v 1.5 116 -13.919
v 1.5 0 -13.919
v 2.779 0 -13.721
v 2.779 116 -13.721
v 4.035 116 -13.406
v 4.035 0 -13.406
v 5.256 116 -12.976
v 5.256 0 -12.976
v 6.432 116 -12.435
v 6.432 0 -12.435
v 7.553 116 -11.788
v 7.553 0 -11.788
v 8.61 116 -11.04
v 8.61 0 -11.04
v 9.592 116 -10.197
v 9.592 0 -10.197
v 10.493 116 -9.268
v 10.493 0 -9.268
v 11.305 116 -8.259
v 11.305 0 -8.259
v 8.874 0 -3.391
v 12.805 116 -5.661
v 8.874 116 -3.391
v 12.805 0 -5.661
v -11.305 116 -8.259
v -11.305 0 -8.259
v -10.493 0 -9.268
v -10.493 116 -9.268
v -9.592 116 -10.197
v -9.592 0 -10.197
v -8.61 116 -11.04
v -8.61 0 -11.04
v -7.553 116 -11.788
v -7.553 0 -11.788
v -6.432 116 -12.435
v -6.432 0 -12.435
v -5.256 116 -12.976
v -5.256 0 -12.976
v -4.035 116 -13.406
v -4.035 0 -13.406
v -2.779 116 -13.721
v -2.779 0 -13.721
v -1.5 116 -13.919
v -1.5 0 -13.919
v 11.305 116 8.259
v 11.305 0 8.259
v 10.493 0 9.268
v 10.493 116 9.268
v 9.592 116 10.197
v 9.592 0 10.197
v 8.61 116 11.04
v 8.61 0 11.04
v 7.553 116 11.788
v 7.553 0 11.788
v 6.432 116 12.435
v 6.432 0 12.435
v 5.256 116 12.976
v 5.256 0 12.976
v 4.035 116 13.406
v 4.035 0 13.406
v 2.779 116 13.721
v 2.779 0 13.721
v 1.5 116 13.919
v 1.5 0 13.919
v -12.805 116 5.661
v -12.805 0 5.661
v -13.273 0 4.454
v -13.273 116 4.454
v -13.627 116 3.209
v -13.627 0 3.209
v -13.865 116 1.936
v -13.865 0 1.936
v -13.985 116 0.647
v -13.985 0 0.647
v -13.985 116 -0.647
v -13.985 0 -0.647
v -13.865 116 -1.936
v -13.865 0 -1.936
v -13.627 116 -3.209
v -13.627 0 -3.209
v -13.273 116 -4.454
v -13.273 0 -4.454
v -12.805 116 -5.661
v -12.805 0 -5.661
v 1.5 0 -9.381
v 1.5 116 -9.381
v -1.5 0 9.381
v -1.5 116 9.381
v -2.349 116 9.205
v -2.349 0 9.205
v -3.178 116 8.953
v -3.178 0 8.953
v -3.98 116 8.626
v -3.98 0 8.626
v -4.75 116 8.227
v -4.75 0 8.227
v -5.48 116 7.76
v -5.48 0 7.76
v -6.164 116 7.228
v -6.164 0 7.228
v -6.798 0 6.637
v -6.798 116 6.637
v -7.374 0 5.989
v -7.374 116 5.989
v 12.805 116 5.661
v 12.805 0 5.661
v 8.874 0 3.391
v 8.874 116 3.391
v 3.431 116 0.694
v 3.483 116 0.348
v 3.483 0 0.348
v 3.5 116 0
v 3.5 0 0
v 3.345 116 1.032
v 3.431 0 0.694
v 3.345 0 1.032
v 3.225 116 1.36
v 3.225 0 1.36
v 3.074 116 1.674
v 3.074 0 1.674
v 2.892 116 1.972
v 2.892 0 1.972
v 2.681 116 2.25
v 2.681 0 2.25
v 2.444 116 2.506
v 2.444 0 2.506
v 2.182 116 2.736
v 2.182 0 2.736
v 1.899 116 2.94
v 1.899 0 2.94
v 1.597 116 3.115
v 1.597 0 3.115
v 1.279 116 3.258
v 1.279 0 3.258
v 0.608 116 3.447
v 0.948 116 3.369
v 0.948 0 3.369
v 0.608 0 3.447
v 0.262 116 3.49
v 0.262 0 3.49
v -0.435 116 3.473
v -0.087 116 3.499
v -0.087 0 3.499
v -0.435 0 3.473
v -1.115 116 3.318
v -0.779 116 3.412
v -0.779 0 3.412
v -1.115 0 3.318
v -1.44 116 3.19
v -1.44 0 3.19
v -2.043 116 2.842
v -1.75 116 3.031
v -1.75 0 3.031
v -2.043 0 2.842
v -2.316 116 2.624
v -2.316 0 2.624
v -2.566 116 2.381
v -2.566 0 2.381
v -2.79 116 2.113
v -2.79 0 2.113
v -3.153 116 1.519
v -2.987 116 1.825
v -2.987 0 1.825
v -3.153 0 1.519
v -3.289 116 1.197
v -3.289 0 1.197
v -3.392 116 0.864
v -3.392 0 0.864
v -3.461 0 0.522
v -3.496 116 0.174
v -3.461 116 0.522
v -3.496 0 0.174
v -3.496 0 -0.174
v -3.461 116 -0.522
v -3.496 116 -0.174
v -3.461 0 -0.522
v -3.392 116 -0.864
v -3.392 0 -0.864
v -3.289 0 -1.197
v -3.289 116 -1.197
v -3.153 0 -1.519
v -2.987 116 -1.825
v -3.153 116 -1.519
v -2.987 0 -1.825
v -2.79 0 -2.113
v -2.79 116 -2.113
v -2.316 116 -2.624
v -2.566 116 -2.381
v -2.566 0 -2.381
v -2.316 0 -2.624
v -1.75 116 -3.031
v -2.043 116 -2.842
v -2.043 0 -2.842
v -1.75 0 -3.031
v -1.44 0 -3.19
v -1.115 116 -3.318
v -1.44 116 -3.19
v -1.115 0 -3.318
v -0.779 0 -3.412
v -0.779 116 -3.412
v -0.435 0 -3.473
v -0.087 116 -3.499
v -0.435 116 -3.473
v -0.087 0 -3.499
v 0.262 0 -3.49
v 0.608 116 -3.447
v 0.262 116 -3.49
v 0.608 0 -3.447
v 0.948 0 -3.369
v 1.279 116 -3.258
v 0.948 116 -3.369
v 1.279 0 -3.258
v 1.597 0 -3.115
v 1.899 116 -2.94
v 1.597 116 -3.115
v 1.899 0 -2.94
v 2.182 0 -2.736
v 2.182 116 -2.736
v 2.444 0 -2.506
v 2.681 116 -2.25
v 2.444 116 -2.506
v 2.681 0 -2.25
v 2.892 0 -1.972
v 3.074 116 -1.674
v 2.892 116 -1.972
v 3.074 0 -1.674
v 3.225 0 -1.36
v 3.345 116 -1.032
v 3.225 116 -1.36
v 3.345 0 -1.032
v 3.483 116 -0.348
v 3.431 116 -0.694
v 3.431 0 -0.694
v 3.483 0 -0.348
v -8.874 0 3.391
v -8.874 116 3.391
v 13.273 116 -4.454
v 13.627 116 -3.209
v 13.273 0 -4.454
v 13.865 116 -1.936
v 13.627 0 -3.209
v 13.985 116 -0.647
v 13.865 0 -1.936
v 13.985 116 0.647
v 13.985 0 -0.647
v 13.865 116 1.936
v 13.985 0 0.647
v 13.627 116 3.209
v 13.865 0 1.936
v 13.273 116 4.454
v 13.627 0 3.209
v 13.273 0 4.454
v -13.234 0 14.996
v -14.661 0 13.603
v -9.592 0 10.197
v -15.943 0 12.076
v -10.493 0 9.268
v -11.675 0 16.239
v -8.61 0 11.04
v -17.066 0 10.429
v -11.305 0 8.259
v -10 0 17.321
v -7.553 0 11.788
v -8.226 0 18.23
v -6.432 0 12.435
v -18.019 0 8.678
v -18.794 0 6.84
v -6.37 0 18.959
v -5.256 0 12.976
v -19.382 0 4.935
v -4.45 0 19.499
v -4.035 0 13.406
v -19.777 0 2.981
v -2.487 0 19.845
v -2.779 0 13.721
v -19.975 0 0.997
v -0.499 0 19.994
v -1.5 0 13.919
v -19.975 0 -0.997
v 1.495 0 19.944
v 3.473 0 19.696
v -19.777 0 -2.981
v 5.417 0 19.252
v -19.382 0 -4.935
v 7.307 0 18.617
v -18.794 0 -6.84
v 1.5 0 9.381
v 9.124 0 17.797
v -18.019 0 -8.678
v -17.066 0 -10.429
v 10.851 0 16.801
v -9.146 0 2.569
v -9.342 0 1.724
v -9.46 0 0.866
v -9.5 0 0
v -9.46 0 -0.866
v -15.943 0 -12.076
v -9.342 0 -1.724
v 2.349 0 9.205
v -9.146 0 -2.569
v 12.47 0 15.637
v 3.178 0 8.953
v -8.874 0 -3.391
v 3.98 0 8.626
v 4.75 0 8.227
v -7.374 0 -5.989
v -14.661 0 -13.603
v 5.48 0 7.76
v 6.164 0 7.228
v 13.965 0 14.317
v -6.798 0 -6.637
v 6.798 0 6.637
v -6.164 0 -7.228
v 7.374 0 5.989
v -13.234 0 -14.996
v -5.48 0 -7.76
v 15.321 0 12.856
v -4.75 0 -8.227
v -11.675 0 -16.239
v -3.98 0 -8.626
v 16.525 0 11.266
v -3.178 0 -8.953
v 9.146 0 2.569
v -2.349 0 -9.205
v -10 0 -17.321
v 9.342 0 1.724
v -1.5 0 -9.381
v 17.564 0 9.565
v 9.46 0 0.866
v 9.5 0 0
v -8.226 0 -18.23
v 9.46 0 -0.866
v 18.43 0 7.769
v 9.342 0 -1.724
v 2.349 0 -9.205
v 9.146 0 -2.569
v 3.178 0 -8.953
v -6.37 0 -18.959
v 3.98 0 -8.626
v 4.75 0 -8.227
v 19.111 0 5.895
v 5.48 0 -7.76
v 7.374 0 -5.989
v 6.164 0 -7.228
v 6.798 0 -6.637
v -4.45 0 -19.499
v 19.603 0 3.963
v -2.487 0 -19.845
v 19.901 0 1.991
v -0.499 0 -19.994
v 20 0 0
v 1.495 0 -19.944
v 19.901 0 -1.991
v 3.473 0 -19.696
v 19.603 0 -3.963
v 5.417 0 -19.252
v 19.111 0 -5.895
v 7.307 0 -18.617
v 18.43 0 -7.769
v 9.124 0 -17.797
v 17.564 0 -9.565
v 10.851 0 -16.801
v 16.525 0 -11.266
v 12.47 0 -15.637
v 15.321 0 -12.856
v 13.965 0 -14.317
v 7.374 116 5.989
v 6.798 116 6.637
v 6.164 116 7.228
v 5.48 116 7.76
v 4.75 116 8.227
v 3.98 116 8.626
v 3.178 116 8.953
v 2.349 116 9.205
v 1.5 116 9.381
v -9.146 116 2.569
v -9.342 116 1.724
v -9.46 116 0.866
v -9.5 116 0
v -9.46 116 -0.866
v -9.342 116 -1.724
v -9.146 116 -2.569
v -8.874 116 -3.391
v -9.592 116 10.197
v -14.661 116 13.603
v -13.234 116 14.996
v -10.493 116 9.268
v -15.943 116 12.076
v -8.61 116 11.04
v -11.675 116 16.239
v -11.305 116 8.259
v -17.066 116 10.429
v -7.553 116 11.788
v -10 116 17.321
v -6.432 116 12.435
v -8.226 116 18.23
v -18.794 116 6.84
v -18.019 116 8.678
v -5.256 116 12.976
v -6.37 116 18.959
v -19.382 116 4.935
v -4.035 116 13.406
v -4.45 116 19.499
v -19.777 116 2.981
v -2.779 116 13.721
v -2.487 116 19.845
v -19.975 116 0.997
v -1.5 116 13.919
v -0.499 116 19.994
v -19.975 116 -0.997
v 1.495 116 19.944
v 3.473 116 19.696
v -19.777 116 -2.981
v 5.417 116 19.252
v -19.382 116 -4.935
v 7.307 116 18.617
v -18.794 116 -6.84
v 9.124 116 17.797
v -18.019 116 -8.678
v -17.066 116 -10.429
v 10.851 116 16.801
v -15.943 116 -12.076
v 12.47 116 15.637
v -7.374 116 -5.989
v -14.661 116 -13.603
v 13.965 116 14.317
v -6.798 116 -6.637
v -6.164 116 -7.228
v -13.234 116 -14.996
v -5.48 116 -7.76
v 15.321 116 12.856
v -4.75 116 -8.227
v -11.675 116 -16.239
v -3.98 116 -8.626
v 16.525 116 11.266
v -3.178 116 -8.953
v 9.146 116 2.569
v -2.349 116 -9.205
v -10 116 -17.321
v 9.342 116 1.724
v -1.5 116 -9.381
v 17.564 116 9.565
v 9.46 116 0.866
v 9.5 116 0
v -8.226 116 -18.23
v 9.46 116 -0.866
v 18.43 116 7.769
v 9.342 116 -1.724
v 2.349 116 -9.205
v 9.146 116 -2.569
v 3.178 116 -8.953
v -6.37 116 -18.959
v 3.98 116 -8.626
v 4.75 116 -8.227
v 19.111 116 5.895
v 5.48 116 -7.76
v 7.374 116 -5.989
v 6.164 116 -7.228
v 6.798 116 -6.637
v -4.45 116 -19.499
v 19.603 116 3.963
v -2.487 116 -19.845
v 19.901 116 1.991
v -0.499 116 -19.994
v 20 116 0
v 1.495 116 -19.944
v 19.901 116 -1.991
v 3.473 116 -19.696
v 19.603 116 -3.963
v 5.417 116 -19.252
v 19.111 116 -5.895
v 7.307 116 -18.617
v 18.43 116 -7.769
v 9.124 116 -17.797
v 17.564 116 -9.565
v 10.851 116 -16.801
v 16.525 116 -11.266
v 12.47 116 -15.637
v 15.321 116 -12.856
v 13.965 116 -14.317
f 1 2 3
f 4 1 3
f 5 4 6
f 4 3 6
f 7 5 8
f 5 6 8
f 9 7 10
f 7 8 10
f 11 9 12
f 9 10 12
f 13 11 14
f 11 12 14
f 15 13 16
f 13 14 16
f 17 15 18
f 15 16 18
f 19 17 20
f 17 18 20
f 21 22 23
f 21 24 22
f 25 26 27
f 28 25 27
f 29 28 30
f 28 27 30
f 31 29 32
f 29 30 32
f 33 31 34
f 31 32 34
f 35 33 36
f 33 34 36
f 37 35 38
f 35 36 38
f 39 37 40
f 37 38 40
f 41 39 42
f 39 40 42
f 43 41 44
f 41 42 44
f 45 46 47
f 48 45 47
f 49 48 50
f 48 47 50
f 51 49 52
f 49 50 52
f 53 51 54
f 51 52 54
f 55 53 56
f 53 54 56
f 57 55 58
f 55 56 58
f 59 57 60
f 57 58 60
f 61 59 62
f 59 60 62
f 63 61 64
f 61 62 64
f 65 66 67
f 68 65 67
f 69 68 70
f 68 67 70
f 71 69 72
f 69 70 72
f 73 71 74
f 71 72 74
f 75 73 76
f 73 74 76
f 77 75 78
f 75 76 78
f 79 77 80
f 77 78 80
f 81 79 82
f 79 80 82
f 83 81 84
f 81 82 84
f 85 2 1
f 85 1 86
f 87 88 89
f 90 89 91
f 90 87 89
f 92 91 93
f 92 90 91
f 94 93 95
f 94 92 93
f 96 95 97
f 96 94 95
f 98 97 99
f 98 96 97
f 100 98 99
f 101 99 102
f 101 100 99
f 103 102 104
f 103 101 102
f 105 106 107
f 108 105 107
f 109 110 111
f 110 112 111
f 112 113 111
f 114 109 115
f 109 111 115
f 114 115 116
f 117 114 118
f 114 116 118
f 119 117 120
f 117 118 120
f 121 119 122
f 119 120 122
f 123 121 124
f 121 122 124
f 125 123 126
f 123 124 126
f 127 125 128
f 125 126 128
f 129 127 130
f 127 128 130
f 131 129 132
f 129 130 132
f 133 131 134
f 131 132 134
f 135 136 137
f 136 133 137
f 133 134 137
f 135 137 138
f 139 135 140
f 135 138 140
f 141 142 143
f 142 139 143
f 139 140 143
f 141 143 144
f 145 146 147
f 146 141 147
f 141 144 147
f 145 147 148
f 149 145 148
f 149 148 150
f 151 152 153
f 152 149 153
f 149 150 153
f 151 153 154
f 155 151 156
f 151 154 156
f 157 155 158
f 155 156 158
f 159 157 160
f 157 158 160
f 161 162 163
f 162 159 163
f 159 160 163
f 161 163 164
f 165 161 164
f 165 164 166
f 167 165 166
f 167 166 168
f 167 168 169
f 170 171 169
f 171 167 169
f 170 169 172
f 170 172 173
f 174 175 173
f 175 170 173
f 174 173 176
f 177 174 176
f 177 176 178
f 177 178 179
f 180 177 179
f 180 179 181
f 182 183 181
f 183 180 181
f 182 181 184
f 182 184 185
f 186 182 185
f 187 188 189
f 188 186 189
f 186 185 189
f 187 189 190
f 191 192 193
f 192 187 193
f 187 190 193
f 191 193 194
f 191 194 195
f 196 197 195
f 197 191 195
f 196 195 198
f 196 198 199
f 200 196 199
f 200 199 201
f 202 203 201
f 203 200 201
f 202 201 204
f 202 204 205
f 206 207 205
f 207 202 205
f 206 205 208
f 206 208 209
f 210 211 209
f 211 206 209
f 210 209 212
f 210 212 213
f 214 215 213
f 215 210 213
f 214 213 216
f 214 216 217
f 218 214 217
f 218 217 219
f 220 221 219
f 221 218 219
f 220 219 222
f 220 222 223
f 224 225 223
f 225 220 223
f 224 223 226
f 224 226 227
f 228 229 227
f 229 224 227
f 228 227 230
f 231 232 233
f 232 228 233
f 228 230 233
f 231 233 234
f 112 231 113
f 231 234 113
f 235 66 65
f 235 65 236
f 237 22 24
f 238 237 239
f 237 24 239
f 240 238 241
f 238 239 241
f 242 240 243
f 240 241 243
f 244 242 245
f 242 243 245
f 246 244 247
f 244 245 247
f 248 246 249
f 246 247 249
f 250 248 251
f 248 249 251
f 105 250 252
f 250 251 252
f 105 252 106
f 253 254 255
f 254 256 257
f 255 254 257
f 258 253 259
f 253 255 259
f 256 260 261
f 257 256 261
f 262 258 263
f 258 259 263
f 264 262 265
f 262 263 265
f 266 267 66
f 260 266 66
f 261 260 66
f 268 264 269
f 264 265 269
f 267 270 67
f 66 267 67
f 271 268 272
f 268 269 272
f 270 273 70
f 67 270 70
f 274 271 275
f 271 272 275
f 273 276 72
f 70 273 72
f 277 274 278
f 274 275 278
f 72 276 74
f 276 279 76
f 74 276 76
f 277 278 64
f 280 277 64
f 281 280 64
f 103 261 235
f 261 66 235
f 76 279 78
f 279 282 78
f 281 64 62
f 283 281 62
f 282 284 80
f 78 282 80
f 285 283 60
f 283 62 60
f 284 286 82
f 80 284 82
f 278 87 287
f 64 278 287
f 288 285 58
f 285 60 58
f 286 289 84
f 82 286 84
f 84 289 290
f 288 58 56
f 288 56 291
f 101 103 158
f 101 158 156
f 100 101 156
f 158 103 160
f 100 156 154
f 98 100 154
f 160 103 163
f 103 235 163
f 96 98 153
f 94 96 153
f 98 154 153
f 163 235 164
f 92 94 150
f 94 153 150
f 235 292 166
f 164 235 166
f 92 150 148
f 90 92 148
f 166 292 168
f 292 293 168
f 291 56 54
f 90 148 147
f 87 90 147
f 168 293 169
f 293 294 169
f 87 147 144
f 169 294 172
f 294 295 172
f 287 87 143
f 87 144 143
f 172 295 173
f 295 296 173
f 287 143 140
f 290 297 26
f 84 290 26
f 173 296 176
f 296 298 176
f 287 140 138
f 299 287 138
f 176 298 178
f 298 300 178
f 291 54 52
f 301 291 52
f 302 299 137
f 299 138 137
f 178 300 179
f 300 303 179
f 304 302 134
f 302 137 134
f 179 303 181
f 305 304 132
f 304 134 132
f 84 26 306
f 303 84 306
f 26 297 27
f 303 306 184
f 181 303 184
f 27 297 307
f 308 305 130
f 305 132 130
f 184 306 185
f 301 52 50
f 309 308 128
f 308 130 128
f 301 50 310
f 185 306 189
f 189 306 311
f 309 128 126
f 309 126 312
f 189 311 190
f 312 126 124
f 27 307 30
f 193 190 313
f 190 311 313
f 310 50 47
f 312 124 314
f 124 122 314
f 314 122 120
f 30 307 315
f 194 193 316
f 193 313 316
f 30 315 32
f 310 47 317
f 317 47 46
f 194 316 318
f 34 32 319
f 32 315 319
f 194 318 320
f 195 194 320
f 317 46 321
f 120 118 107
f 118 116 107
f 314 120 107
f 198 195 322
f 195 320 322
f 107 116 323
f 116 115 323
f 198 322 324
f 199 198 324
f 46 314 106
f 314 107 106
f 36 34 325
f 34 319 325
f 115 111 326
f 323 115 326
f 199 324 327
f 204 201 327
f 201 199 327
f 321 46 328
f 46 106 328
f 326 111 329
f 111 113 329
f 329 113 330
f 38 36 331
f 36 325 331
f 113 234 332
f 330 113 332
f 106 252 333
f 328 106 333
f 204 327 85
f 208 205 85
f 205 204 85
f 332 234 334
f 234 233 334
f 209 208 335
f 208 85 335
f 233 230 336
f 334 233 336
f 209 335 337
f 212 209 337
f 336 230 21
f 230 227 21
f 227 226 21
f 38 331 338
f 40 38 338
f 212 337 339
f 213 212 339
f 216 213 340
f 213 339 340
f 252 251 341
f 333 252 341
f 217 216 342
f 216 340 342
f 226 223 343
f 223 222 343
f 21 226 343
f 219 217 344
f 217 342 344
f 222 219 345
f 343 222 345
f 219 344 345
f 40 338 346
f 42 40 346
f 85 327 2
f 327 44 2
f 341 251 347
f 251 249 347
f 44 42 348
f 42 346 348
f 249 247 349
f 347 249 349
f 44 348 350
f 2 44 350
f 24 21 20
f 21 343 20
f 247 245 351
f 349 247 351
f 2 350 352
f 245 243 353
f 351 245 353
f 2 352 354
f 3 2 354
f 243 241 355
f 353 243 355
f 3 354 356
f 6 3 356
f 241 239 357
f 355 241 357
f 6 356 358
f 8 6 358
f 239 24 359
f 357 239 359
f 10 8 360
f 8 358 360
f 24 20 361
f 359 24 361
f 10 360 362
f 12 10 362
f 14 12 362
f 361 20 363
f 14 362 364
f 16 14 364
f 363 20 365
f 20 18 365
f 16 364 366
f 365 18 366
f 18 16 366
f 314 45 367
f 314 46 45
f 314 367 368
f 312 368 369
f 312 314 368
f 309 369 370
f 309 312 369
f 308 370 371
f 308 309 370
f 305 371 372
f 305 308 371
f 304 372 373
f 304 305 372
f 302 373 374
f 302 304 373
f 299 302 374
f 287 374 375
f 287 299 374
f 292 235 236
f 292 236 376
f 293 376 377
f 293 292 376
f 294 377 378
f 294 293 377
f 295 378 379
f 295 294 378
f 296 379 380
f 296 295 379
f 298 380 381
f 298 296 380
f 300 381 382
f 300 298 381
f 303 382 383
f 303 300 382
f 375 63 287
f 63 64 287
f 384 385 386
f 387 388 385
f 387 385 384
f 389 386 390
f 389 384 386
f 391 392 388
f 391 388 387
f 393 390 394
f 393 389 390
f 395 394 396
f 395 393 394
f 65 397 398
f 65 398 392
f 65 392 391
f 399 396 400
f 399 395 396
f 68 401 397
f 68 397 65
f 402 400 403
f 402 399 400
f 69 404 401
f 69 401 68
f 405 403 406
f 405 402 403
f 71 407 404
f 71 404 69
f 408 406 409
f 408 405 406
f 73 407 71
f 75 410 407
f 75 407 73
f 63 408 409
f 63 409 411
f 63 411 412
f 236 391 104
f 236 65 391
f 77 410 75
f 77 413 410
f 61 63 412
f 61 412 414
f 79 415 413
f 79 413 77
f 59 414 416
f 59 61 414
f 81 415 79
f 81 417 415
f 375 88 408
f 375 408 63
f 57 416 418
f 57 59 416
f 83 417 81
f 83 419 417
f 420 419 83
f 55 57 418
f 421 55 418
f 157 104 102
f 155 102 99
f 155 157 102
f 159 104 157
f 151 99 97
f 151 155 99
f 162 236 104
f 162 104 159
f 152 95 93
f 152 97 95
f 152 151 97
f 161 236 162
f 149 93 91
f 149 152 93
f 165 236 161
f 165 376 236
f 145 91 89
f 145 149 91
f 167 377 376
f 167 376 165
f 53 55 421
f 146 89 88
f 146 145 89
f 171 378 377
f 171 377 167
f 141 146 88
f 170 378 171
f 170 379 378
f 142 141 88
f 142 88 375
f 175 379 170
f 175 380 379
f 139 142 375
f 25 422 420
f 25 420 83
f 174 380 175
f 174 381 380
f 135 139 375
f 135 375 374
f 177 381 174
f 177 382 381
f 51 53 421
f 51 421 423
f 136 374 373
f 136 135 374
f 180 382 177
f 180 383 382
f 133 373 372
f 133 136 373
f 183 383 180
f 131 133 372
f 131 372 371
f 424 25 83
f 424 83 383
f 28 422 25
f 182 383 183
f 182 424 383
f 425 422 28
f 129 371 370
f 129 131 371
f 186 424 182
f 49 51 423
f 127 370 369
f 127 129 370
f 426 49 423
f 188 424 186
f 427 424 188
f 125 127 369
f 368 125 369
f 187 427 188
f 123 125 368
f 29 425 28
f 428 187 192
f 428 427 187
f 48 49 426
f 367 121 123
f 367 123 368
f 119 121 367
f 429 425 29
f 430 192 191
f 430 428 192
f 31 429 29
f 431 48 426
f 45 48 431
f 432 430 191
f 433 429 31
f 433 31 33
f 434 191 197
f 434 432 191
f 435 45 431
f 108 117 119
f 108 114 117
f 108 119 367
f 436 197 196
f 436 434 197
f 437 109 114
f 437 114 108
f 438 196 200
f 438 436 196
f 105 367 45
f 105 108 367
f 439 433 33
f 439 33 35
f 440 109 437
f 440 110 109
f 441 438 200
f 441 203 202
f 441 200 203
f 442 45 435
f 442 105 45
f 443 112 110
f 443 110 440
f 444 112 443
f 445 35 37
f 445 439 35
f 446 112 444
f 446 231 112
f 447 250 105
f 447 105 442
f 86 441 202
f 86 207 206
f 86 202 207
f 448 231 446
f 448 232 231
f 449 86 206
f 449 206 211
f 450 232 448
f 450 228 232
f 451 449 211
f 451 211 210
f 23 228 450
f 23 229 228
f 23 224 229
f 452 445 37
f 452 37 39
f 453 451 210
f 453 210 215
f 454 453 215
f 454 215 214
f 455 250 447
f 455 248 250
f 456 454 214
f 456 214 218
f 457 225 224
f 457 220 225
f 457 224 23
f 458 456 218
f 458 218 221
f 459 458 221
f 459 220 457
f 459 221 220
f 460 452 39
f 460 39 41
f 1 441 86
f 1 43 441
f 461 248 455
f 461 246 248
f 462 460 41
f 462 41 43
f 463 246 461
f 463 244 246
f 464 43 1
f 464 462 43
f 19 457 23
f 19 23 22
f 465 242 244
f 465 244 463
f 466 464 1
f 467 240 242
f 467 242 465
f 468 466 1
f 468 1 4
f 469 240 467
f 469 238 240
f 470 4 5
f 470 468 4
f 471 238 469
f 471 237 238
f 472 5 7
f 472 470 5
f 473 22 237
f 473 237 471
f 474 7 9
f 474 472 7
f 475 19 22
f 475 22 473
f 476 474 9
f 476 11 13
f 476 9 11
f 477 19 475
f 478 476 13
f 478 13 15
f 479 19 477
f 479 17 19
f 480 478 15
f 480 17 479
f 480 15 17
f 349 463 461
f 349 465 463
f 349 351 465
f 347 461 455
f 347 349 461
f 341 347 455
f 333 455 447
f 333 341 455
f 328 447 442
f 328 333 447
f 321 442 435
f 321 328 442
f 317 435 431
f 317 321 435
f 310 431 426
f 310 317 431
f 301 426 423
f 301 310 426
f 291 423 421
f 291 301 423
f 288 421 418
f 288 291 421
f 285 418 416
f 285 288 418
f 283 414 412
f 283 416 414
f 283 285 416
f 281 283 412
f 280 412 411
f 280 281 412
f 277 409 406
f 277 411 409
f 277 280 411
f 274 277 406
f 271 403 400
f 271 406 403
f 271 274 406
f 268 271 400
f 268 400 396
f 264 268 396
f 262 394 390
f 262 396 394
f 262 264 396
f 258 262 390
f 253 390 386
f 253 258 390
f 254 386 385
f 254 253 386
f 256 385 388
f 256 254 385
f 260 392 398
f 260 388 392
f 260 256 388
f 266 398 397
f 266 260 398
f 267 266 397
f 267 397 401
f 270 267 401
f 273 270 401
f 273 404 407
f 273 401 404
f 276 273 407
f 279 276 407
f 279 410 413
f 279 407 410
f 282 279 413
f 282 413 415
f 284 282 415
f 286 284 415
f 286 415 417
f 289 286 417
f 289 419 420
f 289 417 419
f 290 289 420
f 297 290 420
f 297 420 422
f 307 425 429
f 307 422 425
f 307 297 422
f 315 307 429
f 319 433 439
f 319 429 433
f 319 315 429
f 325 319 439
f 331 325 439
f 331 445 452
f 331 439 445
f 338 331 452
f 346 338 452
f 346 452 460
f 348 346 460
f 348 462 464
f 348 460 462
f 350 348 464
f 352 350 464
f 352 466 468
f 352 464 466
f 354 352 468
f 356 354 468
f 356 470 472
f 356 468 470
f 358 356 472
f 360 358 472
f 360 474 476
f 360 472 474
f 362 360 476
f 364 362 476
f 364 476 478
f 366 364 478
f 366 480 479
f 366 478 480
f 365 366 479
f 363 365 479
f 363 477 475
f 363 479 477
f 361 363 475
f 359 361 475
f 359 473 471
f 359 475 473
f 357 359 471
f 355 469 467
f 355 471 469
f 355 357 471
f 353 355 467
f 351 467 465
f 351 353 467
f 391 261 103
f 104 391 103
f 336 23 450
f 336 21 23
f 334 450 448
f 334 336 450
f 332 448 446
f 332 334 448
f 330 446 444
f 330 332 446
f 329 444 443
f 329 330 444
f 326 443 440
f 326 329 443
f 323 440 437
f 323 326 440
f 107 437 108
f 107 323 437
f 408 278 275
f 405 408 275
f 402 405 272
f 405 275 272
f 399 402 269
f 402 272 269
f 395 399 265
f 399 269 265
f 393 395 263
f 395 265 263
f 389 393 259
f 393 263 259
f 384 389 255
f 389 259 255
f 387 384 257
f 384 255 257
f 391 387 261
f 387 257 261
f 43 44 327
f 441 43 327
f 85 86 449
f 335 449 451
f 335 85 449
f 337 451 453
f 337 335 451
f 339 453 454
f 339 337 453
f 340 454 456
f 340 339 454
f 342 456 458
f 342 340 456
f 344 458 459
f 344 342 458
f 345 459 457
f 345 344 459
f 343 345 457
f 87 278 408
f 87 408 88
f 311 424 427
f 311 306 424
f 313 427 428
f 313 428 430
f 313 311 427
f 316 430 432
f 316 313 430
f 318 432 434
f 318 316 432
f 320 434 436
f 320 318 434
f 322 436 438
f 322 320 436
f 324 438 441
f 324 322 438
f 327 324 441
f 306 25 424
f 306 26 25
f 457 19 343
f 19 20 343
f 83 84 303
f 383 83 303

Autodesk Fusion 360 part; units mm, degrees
sketch "Sketch2" plane through (0, 0, 0) normal (0, 1, 0) x (1, 0, 0)
  circle A0 centre (0, 0) radius 3.5
  circle A1 centre (0, 0) radius 9.5
  circle A2 centre (0, 0) radius 20
  circle A3 centre (0, 0) radius 14
  line L0 (0, 9.5) -> (0, 14)
  line L1 (-1.5, 13.9194) -> (-1.5, 9.3808)
  line L2 (1.5, 13.9194) -> (1.5, 9.3808)
  dimension "d5" = 7
  dimension "d6" = 6
  dimension "d7" = 40
  dimension "d8" = 6
  dimension "d11" = 1.5
  dimension "d12" = 1.5
extrude "Extrude3" add sketch "Sketch2" along normal blind 116 contours A1 A3 L0 L2 | A1 A3 L0 L1 makes body 1
extrude "Extrude2" add sketch "Sketch2" along normal blind 116 separate body contours A1 | A2 makes body 2 at (9.4528, 38.6667, 0.9459) makes body 3 at (19.9751, 77.3333, 0.9969)
pattern_circular "C-Pattern1" count 6 over 360 about axis through (0, 1.75, 0) along (0, 1, 0) of bodies 1 makes body 4 at (-9.9944, 38.6667, -7.5023) makes body 5 at (-11.4944, 38.6667, 4.9042) makes body 6 at (-1.5, 38.6667, 12.4066) makes body 7 at (9.9944, 38.6667, 7.5023) makes body 8 at (9.9944, 38.6667, -7.5023)
combine "Combine1" operation add target body 1 tool bodies 2 3 7 8 4 5 6
